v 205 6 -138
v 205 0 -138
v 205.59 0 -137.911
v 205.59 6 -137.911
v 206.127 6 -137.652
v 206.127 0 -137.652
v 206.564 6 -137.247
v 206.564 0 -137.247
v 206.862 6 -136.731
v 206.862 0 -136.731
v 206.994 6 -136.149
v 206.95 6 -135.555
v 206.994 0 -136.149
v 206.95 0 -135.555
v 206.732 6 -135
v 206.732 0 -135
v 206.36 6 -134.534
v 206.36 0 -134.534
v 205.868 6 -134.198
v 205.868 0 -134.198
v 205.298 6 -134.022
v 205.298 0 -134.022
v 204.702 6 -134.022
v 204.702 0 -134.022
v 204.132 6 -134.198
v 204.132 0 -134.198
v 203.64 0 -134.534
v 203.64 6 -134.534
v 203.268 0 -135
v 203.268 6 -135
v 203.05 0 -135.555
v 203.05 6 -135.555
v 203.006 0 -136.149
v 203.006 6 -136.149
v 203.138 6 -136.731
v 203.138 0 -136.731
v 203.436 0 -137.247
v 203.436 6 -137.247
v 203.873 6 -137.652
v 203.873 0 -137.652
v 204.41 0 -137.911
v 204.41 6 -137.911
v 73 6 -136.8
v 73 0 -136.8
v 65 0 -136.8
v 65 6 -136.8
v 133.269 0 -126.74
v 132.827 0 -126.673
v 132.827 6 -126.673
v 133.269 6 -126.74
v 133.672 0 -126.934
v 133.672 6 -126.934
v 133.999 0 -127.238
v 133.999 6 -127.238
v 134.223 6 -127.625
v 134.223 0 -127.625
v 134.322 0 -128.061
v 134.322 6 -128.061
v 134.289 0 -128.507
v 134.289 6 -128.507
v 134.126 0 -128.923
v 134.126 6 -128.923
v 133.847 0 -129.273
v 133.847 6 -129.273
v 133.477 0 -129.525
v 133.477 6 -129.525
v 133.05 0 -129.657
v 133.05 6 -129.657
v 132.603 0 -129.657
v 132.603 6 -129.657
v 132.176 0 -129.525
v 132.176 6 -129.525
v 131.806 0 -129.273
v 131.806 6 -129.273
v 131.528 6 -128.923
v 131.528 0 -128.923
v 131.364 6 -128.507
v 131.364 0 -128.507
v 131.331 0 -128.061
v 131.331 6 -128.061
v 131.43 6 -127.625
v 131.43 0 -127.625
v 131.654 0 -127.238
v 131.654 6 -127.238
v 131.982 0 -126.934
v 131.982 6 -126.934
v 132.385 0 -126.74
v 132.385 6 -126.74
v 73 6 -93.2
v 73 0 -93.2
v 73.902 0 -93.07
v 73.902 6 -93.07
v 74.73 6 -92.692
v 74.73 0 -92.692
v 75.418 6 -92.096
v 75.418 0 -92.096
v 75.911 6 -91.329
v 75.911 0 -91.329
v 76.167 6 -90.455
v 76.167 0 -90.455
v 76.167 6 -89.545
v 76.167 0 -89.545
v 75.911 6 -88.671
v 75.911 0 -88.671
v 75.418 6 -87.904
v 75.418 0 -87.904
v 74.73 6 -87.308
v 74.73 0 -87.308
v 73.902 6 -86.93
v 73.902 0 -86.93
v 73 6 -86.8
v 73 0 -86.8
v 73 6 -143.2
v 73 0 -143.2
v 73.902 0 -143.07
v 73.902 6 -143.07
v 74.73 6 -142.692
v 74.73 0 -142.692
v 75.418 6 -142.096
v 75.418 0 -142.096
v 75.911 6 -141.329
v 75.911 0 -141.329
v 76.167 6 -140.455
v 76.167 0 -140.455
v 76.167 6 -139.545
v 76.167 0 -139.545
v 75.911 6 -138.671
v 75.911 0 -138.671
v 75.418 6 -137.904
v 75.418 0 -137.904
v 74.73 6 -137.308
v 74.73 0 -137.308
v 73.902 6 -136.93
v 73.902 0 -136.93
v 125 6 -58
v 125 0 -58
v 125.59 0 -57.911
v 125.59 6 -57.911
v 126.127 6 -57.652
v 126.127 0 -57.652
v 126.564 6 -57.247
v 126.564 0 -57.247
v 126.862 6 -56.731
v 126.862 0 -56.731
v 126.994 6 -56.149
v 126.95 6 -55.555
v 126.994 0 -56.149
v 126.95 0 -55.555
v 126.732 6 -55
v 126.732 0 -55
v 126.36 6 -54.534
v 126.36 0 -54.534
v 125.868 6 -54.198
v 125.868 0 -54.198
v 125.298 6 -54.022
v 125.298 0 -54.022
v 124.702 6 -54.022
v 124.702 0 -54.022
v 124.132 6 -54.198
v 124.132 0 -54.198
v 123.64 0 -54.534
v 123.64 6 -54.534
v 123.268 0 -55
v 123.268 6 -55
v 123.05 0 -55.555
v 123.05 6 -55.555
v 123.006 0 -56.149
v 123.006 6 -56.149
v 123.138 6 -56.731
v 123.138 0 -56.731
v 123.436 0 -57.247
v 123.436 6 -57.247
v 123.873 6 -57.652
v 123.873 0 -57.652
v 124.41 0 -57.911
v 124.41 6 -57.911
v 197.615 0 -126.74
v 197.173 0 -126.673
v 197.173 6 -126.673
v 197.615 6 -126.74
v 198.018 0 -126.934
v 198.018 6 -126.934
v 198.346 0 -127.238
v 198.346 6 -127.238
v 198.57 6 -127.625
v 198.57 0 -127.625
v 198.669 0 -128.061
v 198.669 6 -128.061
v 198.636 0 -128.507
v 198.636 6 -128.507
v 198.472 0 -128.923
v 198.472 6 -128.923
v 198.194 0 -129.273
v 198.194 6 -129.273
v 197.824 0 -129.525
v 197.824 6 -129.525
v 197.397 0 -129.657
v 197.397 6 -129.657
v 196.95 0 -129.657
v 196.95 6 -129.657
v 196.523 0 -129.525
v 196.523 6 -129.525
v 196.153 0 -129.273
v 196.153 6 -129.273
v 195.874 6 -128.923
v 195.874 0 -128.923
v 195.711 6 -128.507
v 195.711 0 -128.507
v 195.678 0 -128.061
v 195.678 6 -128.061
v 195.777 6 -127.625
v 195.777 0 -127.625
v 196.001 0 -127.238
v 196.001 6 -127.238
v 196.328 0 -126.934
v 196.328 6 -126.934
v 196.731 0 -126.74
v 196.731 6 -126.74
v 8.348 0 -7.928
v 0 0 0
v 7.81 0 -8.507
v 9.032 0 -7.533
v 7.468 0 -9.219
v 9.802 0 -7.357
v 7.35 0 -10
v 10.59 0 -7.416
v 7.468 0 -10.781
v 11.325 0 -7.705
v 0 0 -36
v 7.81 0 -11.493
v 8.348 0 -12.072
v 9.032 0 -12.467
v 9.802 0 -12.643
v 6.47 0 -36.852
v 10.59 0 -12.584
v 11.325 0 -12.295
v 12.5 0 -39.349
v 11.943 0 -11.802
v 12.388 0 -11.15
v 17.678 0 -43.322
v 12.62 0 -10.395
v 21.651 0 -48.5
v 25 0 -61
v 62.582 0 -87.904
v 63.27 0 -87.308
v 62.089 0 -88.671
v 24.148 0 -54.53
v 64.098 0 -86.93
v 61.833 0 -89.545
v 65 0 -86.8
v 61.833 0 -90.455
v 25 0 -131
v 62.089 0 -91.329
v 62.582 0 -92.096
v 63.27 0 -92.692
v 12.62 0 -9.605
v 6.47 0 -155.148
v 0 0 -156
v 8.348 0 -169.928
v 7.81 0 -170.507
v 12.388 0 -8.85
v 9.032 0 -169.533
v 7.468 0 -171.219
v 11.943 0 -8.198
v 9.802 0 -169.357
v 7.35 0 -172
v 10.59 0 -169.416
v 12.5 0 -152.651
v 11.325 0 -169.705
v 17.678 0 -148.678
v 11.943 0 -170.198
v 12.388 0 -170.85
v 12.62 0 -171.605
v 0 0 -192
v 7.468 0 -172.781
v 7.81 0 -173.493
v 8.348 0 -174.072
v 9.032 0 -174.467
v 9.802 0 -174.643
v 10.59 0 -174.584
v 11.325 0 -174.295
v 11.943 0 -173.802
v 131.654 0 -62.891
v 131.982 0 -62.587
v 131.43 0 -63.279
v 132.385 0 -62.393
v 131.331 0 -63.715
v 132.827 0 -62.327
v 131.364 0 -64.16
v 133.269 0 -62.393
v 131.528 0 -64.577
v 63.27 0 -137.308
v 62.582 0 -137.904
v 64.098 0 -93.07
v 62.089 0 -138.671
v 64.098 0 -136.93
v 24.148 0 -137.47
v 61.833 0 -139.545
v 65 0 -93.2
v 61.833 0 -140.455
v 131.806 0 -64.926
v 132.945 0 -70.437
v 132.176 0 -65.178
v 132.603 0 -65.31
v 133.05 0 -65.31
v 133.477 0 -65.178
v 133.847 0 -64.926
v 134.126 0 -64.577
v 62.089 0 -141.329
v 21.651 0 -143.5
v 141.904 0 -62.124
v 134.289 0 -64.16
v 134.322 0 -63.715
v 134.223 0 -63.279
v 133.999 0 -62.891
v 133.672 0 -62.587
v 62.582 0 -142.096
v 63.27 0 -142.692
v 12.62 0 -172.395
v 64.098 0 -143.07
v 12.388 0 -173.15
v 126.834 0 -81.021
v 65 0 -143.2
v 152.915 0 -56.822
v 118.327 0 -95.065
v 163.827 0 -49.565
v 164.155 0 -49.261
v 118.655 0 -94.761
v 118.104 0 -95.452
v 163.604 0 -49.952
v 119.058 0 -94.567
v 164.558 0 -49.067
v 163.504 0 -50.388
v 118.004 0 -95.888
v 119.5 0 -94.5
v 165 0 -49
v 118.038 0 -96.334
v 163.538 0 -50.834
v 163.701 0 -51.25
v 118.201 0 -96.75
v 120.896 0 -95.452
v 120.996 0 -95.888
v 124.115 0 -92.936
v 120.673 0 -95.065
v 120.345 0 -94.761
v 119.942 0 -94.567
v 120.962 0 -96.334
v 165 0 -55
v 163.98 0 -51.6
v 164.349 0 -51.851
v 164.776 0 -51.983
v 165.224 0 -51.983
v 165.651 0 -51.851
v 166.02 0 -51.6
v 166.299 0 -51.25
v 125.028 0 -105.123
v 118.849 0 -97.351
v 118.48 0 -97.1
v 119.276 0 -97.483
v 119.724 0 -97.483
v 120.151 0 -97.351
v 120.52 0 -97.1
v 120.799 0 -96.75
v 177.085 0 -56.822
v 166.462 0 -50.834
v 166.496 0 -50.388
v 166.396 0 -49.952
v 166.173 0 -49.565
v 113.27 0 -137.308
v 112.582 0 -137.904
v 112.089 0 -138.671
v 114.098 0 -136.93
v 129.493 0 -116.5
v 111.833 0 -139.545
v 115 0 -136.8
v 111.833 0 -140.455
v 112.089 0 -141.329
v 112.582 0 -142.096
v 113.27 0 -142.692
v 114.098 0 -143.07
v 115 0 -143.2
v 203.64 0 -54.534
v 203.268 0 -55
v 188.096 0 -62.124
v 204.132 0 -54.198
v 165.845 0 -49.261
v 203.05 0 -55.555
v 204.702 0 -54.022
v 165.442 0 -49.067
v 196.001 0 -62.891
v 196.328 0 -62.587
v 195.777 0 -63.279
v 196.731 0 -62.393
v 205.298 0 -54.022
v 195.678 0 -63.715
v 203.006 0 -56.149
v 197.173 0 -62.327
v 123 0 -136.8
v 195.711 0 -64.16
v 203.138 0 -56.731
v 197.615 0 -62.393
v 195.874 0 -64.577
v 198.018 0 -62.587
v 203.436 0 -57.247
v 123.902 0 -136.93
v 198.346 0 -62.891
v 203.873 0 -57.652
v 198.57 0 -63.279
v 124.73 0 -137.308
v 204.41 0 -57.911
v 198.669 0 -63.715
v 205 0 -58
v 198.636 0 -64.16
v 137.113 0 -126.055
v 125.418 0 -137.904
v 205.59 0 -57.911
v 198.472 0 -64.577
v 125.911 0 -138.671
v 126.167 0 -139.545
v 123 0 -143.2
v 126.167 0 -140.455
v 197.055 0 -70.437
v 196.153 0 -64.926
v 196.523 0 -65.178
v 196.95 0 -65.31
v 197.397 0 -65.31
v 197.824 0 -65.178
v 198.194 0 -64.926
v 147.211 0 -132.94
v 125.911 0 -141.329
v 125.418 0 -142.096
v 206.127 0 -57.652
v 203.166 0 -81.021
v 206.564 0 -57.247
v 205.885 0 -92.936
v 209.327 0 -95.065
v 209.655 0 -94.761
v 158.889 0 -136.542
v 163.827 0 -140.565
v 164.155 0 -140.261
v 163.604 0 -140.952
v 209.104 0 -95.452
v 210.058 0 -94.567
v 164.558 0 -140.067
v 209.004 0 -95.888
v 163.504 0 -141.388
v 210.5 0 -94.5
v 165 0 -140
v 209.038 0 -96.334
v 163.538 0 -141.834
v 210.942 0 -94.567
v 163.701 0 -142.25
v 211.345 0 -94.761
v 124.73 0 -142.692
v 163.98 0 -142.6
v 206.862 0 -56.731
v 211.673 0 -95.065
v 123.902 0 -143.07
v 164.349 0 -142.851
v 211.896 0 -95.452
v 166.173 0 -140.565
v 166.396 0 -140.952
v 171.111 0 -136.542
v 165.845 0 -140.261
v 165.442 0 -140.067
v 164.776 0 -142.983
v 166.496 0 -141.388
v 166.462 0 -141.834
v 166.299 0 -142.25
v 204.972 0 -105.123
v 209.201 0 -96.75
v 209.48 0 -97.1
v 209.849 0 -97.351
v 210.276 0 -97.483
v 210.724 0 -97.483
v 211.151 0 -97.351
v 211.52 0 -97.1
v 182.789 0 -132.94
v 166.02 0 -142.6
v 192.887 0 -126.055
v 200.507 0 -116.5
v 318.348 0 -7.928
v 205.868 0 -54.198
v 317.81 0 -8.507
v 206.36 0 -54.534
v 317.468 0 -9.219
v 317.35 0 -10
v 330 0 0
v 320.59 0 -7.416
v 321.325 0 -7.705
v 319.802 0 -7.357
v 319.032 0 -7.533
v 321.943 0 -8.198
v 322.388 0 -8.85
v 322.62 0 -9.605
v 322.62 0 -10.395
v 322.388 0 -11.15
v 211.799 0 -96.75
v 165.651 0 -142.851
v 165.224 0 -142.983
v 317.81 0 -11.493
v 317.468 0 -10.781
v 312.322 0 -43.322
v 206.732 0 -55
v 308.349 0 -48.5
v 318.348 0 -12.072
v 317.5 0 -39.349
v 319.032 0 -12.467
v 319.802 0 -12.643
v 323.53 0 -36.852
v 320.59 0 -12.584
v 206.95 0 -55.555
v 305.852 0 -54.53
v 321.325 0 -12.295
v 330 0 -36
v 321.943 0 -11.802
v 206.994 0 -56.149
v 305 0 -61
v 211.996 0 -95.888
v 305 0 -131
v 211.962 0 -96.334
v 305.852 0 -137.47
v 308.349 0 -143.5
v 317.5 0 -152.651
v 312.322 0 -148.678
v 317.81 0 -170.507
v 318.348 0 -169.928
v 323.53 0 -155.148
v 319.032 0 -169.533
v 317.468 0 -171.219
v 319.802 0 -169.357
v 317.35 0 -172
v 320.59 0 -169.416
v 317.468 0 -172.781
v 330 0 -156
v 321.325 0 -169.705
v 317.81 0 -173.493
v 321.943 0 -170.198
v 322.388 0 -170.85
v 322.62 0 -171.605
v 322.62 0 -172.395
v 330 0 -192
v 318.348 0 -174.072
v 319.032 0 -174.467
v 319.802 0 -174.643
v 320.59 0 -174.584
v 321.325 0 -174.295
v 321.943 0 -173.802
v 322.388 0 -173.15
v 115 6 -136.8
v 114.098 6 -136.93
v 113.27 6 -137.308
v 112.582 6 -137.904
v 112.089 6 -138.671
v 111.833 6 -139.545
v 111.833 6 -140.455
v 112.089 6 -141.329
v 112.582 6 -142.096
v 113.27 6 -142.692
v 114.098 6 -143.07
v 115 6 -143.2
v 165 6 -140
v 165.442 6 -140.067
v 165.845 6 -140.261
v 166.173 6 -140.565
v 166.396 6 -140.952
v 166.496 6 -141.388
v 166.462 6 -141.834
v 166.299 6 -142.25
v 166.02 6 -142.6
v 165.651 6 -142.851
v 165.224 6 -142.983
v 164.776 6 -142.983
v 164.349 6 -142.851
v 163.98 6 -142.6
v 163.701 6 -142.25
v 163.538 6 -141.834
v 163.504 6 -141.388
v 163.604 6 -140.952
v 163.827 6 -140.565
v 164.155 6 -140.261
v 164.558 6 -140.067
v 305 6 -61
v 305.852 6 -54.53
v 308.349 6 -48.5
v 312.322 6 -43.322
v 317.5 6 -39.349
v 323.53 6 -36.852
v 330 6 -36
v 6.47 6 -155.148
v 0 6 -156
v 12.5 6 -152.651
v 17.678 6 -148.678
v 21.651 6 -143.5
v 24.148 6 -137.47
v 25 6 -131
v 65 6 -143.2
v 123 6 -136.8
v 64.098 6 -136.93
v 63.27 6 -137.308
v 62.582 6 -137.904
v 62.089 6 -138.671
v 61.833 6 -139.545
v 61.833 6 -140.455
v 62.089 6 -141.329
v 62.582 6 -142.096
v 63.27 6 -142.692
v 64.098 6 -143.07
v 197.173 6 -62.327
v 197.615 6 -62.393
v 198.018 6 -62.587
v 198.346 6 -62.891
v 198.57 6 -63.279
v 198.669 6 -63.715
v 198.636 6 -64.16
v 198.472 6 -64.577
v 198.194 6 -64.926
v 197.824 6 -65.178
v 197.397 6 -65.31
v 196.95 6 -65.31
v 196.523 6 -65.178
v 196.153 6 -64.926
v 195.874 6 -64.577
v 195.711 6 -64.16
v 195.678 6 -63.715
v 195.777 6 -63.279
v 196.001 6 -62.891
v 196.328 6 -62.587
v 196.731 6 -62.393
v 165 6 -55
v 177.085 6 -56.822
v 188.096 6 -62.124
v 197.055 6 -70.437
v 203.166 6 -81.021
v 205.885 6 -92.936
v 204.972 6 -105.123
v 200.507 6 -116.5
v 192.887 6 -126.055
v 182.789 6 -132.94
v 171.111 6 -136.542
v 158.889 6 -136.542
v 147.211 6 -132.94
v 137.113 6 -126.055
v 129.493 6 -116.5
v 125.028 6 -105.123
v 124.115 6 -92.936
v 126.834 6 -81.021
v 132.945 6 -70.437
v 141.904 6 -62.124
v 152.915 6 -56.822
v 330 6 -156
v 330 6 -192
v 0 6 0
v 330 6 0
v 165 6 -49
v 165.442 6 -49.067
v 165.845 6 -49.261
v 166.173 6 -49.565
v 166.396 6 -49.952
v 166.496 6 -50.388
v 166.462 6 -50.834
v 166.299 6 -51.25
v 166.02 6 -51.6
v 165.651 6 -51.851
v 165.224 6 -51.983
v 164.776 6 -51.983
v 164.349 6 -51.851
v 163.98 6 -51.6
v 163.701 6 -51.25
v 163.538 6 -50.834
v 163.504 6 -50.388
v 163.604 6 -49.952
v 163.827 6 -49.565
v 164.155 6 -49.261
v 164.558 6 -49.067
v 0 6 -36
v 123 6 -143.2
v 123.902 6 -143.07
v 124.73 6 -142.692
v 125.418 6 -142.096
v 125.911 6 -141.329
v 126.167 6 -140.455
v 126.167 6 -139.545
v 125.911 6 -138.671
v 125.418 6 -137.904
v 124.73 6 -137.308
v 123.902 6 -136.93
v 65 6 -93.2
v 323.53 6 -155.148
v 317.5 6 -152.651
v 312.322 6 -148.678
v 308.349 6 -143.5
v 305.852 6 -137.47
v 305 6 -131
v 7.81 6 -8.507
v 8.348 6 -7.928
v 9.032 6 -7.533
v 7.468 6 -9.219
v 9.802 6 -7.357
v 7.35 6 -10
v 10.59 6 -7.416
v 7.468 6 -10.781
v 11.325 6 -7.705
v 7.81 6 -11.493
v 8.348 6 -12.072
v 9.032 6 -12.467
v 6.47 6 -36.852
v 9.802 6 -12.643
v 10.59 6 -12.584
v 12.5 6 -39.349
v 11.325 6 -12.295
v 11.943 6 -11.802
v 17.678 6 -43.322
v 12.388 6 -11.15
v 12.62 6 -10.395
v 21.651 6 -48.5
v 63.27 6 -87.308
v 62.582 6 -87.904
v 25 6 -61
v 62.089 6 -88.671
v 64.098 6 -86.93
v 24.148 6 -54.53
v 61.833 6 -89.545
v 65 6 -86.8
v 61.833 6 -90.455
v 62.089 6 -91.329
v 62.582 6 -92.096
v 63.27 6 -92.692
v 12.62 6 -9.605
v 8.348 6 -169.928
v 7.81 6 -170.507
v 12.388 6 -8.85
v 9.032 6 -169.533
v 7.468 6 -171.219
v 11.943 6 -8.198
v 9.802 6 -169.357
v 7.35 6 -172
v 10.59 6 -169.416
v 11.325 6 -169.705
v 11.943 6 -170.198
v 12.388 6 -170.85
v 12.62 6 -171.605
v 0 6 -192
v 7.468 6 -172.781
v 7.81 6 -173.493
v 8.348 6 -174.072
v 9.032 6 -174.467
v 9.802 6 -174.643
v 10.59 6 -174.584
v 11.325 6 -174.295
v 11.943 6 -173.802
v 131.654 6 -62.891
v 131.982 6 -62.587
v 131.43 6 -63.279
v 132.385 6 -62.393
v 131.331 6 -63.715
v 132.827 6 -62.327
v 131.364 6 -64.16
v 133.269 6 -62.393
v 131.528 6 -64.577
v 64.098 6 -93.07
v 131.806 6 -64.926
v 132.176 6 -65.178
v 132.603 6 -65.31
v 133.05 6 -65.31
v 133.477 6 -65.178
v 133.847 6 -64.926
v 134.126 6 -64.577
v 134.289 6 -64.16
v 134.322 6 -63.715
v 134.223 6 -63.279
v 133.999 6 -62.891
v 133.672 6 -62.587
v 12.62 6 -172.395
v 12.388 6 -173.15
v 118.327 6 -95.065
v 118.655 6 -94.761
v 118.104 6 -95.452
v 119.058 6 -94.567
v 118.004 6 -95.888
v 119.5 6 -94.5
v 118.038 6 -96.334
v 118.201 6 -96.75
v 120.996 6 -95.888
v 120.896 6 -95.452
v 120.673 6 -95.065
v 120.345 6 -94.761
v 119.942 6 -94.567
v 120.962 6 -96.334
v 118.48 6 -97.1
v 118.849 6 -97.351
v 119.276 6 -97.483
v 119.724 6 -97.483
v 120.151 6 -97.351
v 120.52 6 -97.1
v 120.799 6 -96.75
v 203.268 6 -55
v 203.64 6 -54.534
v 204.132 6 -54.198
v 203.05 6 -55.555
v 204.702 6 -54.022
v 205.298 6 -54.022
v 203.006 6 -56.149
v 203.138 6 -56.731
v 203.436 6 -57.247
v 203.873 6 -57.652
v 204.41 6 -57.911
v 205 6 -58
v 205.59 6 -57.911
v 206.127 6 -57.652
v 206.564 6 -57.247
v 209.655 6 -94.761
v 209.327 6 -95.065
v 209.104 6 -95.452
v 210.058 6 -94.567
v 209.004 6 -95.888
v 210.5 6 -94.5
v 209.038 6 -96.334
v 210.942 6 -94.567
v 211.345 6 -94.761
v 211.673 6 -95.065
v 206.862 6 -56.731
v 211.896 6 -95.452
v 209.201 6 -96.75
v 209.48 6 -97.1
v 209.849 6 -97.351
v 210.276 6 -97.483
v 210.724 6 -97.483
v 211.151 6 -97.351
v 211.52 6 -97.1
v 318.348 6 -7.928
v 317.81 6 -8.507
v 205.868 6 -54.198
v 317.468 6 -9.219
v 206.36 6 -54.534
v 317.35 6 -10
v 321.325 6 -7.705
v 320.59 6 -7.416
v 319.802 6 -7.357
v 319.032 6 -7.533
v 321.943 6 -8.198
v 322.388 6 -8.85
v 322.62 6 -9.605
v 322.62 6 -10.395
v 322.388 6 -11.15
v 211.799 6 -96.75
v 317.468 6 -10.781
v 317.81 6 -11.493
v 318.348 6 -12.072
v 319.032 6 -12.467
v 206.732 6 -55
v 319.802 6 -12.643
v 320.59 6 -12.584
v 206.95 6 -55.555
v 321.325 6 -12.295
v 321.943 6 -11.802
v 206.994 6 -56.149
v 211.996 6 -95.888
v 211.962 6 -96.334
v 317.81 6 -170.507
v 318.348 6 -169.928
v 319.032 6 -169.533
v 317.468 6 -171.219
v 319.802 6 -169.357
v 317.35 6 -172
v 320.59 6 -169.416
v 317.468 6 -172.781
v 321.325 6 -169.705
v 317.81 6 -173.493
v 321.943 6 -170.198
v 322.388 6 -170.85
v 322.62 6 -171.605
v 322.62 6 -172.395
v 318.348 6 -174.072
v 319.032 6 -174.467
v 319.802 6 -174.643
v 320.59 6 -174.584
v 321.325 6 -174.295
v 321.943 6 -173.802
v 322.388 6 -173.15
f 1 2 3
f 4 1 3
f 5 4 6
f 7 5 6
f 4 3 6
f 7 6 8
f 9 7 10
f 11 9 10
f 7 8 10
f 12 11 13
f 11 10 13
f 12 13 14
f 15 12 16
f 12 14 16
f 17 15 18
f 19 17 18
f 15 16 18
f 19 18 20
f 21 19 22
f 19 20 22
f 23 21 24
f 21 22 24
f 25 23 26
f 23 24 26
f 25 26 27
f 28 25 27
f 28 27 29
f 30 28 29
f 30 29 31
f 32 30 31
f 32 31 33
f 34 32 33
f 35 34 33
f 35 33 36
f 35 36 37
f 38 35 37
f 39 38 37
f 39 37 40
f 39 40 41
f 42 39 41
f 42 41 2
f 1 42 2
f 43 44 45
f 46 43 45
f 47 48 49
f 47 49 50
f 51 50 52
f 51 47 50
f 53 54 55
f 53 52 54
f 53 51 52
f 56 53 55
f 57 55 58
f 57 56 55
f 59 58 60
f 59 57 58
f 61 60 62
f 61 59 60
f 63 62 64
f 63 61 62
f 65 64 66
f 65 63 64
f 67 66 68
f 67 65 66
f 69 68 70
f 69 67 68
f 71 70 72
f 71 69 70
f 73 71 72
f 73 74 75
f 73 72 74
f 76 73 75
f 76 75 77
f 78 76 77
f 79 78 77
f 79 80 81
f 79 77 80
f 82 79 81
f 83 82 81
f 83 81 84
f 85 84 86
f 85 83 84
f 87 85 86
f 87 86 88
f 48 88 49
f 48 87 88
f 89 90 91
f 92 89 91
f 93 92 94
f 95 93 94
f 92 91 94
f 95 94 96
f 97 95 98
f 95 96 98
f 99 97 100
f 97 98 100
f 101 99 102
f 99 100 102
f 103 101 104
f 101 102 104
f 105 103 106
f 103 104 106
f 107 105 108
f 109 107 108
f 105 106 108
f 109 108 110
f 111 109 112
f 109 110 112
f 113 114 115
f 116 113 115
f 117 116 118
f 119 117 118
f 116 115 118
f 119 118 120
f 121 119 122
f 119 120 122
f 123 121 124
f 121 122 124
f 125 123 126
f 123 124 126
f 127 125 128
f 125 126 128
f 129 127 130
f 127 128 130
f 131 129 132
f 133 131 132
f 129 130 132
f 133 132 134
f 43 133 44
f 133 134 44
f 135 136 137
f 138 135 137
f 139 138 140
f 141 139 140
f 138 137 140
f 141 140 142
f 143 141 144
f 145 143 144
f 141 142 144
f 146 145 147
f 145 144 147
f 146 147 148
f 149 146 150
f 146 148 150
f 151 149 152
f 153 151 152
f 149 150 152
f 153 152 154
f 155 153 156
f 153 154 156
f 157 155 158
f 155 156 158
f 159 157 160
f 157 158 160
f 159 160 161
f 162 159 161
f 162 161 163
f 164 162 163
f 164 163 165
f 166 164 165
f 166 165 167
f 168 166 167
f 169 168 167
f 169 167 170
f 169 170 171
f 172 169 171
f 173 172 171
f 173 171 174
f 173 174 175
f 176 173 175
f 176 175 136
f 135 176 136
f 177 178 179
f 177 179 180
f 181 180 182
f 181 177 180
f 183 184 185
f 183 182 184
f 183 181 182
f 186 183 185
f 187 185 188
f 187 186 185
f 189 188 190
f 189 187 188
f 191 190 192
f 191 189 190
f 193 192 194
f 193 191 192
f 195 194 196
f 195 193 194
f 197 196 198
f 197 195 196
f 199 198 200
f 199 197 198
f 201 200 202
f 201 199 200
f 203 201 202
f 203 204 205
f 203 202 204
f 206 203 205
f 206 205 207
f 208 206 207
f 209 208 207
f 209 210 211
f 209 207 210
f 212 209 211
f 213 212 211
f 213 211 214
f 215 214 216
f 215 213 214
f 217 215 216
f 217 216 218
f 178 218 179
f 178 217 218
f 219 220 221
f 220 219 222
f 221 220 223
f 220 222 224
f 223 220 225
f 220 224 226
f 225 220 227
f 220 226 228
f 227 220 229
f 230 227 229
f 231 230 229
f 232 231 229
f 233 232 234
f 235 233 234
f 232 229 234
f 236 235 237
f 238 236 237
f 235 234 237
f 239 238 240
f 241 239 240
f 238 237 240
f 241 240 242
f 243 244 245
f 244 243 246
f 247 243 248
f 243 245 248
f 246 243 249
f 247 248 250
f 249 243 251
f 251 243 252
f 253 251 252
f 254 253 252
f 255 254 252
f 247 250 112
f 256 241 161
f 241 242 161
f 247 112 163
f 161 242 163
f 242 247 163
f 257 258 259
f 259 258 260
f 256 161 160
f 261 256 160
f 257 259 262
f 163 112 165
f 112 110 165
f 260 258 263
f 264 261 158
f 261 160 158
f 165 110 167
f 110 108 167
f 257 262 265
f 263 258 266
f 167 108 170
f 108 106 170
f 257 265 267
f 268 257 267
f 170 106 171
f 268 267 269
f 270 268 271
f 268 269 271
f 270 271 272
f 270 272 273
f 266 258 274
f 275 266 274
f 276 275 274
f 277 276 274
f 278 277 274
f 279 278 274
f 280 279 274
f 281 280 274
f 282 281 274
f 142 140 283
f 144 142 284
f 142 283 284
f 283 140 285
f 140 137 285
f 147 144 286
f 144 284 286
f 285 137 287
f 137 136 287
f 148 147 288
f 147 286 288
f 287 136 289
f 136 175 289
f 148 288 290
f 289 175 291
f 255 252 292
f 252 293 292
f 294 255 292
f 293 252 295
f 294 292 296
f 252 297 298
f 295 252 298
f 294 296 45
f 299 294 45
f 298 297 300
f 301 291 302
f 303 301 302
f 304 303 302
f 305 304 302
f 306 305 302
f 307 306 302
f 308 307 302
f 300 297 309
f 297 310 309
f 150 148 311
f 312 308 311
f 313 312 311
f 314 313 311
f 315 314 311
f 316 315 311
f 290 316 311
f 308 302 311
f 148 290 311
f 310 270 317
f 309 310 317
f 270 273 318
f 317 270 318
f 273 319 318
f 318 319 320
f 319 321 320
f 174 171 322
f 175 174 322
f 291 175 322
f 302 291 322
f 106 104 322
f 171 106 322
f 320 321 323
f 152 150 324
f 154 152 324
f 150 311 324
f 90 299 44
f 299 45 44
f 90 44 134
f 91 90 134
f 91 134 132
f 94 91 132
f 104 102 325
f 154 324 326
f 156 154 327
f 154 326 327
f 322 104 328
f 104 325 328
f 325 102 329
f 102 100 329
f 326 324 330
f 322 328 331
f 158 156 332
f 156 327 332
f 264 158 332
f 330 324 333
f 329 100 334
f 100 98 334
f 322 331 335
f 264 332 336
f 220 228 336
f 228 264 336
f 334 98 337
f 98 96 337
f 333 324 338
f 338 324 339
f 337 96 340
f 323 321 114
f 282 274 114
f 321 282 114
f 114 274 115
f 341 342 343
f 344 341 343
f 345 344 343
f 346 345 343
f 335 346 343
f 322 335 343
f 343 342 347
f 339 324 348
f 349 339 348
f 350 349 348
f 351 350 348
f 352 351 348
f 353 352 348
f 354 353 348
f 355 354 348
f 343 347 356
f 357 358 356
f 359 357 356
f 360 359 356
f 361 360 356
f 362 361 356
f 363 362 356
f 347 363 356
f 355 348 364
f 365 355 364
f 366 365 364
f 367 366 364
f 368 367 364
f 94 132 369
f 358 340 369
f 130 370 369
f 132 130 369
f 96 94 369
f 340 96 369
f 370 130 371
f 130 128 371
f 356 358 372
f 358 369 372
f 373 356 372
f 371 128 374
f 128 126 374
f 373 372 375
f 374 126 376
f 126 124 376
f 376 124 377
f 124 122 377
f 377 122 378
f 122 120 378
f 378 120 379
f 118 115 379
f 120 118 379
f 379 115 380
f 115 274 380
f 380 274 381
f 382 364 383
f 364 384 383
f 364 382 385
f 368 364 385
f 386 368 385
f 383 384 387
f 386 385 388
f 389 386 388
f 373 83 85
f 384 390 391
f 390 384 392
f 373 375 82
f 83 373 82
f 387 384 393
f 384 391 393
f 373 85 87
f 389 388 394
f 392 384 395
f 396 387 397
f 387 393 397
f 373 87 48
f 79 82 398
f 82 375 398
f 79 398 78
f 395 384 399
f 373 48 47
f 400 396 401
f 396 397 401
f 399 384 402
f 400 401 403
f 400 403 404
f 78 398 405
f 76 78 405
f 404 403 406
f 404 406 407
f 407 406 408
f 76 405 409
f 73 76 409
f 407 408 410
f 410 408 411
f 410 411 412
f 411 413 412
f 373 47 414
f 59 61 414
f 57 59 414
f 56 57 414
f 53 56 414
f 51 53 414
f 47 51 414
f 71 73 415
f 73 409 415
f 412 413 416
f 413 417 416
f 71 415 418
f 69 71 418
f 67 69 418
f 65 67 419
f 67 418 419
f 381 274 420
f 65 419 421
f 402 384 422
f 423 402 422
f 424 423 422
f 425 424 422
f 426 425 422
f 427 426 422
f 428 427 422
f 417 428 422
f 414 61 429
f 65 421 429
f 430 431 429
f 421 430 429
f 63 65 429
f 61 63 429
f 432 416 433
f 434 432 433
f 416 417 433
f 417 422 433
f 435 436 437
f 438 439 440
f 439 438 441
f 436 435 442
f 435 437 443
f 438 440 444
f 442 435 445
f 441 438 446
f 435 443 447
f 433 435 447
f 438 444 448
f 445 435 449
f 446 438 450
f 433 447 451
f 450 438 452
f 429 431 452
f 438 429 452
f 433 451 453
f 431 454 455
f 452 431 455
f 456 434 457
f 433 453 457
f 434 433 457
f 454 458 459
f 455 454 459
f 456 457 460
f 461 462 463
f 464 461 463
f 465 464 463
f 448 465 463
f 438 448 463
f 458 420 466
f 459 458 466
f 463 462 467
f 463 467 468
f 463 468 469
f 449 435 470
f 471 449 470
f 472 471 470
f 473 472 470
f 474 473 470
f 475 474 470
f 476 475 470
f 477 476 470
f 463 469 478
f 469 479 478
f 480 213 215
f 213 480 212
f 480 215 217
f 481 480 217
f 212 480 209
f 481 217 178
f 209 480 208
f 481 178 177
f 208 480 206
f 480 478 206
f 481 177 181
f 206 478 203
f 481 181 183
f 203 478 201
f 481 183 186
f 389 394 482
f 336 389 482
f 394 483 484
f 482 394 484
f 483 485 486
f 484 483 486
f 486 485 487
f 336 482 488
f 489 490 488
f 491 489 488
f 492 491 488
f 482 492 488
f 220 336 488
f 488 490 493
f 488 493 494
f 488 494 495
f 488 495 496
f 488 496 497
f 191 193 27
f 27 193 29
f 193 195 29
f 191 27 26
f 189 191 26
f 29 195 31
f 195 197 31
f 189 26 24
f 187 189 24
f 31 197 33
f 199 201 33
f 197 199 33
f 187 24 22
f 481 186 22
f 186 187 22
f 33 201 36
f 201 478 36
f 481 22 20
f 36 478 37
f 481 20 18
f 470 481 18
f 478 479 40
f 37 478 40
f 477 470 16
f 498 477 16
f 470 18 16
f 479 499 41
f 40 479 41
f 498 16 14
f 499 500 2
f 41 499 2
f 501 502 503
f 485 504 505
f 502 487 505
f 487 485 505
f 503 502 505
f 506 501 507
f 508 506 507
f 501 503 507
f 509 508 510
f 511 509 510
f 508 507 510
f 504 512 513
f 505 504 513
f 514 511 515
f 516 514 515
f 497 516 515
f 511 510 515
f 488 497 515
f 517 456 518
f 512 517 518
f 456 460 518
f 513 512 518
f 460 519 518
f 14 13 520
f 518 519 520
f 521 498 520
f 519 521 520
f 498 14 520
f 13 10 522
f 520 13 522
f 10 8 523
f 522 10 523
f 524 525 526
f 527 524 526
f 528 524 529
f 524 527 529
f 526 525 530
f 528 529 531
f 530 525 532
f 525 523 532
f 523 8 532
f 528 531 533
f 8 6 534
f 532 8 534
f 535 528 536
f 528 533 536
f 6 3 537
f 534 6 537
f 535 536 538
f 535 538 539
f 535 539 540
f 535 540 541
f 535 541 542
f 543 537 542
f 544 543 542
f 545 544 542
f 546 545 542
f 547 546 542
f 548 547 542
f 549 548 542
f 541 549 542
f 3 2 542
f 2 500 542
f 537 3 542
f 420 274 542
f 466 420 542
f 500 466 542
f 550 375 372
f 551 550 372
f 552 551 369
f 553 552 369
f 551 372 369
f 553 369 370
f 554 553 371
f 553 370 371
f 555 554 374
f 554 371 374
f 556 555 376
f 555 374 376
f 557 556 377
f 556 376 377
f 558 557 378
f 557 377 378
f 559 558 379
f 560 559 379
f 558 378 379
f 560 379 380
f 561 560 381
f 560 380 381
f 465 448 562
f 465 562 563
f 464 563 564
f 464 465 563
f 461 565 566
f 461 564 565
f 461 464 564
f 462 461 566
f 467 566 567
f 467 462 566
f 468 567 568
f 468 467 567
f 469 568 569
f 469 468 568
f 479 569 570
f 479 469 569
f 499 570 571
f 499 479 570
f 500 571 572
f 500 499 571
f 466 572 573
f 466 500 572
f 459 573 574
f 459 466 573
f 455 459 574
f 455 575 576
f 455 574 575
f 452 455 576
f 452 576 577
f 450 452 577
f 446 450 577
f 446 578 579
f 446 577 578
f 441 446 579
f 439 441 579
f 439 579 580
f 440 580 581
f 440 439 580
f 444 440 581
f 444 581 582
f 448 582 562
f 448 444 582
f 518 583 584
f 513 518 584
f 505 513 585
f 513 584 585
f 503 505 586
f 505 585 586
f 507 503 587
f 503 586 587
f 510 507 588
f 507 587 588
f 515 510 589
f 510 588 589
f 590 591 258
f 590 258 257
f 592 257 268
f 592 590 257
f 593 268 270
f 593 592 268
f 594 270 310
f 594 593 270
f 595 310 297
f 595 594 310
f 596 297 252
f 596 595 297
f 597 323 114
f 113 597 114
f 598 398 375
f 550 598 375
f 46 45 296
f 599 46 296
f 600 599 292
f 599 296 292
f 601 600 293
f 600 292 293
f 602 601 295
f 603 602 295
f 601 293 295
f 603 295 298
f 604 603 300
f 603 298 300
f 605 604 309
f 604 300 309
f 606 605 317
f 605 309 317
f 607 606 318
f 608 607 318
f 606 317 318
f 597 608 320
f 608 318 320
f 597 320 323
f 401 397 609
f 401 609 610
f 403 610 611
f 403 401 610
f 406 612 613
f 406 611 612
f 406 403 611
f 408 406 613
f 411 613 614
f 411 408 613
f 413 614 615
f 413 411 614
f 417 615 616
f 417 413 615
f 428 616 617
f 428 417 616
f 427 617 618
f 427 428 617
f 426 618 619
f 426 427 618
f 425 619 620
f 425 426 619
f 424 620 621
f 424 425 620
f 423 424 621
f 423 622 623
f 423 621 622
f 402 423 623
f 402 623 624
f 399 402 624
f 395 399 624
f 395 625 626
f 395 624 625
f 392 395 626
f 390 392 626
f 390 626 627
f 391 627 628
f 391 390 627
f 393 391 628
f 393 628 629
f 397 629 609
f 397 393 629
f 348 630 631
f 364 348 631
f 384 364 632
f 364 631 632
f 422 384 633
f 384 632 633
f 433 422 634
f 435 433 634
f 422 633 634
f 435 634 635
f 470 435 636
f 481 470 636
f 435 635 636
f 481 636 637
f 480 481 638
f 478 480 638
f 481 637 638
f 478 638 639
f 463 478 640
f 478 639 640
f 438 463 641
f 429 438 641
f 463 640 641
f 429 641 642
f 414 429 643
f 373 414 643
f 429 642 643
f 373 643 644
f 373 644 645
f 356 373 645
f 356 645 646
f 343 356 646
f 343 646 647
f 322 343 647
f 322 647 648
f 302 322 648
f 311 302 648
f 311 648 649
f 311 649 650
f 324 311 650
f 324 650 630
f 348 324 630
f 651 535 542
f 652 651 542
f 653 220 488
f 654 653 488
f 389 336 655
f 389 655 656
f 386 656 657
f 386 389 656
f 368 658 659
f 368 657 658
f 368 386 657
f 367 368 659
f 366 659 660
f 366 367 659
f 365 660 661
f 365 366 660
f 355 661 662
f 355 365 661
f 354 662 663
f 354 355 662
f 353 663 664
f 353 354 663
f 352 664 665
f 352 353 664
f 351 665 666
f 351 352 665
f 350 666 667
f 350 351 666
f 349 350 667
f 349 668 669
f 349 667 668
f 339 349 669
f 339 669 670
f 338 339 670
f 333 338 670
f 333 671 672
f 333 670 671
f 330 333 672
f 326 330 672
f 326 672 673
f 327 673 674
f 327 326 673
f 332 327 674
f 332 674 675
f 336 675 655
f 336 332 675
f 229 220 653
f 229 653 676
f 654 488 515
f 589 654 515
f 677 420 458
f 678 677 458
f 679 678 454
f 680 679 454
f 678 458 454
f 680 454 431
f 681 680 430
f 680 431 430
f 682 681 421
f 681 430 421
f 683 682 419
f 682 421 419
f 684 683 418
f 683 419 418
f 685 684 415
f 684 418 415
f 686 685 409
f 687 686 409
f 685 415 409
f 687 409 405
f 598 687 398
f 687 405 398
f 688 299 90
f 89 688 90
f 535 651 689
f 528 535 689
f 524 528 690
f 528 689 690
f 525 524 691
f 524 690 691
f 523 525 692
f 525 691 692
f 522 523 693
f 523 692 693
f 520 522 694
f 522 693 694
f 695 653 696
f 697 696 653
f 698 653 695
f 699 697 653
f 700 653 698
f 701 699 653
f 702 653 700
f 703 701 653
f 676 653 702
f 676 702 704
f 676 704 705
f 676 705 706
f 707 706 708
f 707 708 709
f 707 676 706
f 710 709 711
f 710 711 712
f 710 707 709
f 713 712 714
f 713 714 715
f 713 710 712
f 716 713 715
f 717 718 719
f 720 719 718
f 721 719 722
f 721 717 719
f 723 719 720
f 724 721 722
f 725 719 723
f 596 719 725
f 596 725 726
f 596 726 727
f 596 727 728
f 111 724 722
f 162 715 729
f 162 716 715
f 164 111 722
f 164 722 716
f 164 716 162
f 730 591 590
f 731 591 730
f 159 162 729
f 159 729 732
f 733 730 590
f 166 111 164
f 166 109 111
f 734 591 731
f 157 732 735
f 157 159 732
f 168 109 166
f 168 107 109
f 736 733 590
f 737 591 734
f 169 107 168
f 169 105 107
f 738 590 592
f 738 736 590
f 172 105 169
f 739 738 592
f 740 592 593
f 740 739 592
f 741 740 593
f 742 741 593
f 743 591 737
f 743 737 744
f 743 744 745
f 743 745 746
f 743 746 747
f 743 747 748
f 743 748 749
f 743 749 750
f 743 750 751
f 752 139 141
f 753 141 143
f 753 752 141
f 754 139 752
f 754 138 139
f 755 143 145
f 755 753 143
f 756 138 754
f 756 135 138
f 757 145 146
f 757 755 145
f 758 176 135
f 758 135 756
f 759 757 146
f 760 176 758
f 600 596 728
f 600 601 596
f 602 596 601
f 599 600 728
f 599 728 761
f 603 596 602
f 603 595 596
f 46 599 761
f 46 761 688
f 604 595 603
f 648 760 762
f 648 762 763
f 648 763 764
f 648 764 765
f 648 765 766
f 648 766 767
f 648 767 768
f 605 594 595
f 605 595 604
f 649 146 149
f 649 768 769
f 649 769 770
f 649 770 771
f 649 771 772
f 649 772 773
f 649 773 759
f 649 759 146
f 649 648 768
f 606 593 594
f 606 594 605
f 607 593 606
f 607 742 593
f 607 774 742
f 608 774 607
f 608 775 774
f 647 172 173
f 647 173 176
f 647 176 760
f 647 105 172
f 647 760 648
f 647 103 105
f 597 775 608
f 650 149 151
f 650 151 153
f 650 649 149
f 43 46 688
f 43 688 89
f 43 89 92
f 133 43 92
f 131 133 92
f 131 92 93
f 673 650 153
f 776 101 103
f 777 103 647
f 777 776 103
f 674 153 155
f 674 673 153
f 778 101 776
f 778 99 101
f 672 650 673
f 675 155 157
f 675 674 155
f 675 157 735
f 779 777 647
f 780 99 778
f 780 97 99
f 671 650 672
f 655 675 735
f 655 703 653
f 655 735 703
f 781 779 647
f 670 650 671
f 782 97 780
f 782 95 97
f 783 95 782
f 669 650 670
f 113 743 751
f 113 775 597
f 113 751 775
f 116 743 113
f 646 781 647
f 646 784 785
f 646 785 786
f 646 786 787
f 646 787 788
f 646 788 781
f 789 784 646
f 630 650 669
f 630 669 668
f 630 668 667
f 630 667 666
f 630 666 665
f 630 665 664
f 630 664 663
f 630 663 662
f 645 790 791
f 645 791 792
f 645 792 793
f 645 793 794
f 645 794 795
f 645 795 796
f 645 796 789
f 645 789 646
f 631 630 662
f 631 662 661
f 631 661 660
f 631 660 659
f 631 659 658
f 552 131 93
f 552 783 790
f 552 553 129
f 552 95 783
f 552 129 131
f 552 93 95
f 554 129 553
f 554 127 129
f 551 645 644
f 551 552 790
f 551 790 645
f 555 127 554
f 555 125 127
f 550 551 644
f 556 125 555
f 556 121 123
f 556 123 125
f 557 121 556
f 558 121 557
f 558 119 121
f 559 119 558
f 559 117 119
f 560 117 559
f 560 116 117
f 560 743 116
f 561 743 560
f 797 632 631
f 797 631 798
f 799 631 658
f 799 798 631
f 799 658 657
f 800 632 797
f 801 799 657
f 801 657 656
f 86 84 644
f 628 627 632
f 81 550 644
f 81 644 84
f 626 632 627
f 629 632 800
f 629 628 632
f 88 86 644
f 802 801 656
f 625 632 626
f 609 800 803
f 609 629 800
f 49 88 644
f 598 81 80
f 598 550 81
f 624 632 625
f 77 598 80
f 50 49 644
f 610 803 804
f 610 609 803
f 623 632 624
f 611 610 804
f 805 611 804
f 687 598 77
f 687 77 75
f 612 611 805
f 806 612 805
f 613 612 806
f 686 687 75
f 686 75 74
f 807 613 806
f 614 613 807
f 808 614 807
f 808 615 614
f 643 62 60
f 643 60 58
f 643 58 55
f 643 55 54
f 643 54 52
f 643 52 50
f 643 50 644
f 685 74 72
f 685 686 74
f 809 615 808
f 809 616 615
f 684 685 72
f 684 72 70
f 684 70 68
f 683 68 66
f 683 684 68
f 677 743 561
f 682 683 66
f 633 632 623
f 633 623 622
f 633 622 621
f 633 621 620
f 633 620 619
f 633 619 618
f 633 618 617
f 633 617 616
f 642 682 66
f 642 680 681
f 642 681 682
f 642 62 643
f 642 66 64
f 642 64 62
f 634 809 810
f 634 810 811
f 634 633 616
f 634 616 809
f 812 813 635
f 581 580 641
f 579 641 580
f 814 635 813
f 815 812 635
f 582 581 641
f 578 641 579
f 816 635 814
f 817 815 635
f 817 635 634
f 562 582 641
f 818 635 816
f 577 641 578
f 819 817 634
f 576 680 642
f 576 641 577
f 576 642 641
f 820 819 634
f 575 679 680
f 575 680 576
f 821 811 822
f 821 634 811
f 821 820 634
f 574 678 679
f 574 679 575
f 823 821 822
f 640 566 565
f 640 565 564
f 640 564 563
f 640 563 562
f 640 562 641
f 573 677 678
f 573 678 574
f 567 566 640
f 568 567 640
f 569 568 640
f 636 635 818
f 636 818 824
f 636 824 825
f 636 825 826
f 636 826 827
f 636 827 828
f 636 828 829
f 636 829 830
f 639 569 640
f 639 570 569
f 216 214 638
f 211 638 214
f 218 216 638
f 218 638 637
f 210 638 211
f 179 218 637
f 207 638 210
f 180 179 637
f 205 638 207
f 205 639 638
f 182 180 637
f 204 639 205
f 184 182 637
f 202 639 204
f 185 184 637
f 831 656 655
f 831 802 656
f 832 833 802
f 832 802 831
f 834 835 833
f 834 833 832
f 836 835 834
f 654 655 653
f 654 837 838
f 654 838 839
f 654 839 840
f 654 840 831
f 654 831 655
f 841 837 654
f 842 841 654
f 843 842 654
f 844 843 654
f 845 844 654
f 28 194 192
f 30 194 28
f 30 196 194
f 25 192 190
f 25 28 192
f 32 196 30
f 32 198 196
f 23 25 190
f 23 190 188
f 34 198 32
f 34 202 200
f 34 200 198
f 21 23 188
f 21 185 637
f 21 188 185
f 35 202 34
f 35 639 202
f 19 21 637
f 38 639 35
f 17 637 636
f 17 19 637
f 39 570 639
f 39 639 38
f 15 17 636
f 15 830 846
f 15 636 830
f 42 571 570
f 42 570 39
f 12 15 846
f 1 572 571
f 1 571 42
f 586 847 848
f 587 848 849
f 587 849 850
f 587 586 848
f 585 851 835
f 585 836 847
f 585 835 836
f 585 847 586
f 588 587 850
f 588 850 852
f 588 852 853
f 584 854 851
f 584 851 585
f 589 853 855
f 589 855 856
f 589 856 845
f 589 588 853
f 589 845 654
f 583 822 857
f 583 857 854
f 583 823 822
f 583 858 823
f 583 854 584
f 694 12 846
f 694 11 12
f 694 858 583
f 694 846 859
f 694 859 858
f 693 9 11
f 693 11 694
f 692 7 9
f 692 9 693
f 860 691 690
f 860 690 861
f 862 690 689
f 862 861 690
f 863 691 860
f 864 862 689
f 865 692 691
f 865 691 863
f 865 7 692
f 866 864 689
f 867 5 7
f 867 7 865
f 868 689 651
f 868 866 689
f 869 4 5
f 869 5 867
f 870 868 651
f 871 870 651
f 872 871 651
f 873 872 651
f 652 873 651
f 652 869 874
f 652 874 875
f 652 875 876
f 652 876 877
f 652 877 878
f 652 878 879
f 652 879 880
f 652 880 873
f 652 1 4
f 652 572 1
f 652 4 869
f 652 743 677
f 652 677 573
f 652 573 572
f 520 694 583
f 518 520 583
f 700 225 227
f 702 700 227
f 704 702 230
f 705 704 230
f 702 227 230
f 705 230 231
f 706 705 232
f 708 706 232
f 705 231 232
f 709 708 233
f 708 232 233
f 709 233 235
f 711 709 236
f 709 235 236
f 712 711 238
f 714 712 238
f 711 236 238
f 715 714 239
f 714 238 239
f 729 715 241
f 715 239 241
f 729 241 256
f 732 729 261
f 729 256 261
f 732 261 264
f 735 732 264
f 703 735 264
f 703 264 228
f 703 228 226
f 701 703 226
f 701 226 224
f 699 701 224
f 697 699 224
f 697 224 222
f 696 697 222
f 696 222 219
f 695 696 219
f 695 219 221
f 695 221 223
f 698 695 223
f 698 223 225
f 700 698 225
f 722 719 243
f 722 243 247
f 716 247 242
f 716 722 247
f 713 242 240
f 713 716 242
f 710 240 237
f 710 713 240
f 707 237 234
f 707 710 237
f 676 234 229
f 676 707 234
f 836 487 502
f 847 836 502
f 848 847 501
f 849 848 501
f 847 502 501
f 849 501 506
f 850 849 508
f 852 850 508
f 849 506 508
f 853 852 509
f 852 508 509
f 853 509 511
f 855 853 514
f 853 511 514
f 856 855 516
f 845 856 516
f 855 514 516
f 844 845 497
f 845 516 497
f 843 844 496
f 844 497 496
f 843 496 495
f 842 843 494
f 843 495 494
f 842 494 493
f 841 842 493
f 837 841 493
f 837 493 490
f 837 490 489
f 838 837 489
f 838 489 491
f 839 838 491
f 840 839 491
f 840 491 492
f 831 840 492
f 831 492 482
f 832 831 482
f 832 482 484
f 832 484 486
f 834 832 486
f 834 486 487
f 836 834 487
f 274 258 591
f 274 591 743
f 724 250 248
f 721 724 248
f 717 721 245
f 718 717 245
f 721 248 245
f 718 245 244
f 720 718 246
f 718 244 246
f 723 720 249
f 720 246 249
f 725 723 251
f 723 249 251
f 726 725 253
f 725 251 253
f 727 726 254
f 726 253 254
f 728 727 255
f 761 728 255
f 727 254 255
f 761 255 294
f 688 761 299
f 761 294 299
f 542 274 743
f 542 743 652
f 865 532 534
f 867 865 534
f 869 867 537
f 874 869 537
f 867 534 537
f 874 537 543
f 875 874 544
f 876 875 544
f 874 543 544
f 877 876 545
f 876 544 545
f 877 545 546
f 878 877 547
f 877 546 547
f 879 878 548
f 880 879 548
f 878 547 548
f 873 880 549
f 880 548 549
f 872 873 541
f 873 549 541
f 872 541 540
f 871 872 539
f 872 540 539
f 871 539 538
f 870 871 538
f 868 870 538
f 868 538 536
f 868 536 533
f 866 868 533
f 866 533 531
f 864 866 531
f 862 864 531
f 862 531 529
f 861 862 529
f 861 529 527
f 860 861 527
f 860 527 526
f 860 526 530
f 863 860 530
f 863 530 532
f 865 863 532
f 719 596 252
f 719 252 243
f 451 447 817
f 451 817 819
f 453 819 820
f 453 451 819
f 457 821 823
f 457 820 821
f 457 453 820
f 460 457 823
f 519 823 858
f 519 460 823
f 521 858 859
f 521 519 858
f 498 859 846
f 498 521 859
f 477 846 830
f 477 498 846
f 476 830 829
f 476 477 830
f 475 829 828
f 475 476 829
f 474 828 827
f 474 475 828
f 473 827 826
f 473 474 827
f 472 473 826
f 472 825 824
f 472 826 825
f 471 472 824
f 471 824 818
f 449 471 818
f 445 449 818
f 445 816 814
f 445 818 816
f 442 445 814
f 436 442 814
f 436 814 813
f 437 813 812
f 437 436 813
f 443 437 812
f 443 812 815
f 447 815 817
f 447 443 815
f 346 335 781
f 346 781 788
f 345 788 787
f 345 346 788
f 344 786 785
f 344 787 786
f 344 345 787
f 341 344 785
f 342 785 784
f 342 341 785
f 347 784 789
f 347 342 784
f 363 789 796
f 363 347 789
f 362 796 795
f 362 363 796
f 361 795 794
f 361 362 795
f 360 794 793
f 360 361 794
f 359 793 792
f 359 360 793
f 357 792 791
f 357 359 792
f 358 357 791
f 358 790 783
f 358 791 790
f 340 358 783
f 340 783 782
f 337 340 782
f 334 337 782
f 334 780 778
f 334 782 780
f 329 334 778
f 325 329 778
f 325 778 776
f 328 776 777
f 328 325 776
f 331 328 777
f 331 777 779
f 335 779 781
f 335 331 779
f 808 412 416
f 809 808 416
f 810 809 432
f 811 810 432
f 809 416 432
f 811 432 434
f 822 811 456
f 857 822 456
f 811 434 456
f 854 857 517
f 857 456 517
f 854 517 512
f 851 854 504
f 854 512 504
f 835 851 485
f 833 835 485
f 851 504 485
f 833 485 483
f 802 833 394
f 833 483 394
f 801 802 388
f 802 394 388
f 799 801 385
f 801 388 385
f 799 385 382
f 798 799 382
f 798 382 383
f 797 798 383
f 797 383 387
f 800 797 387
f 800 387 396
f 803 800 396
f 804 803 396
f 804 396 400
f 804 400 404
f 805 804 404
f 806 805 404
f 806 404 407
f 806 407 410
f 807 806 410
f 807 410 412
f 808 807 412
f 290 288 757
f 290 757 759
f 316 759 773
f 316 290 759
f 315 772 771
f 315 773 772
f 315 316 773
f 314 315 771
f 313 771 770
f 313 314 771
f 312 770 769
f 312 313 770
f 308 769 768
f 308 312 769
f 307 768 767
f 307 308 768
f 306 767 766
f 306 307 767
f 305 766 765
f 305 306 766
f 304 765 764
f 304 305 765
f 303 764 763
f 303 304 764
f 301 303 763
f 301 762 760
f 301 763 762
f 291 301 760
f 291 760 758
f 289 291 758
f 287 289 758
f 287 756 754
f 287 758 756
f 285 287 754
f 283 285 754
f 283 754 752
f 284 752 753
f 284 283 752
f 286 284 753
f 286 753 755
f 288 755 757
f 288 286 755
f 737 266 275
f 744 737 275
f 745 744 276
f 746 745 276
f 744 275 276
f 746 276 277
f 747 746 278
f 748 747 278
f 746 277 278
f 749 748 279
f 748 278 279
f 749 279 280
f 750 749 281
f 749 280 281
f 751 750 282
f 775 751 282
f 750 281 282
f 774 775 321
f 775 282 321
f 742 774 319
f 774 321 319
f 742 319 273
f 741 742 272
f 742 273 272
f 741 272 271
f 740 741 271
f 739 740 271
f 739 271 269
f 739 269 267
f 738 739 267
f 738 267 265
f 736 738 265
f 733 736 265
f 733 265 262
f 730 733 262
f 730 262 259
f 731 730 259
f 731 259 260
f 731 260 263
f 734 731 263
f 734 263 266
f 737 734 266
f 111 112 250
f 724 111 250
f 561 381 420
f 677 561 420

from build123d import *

# Parameters (mm, degrees)
SKETCH1_W                = 330
SKETCH1_H                = 192
BOSS_EXTRUDE1_DEPTH      = 6
CUT_EXTRUDE1_DEPTH       = 382.837661841
CUT_EXTRUDE1_DEPTH_BACK  = 382.837661841
SKETCH2_R                = 1.5
SKETCH3_R                = 41
CUT_EXTRUDE2_DEPTH       = 382.837661841
CUT_EXTRUDE5_DEPTH       = 10
SKETCH11_R               = 2
CUT_EXTRUDE6_DEPTH       = 10
M5_CLEARANCE_HOLE1_D     = 5.3
M5_CLEARANCE_HOLE1_DEPTH = 11.94
M5_CLEARANCE_HOLE1_TIP   = 1.59228064
CUT_EXTRUDE10_DEPTH      = 382.837661841


with BuildPart() as part:
    # Sketch1 → Boss-Extrude1 (new body)
    with BuildSketch(Plane(origin=(0, 0, 0), x_dir=(1, 0, 0), z_dir=(0, 1, 0))):
        with Locations((165, 96)):
            Rectangle(SKETCH1_W, SKETCH1_H)
    extrude(amount=BOSS_EXTRUDE1_DEPTH)

    # Sketch2 → Cut-Extrude1 (cut, two sides: drawn at the far end of the back side and taken through both)
    with BuildSketch(Plane(origin=(0, 6, 0), x_dir=(1, 0, 0), z_dir=(0, 1, 0)).offset(-CUT_EXTRUDE1_DEPTH_BACK)):
        with Locations(Location((165, 141.5, 0), (0, 0, 270))):
            Circle(SKETCH2_R)
        with Locations(Location((197.173358544, 128.173358544, 0), (0, 0, 270))):
            Circle(SKETCH2_R)
        with Locations(Location((210.5, 96, 0), (0, 0, 270))):
            Circle(SKETCH2_R)
        with Locations(Location((165, 50.5, 0), (0, 0, 270))):
            Circle(SKETCH2_R)
        with Locations(Location((132.826641456, 63.826641456, 0), (0, 0, 270))):
            Circle(SKETCH2_R)
        with Locations(Location((119.5, 96, 0), (0, 0, 270))):
            Circle(SKETCH2_R)
        with Locations(Location((132.826641456, 128.173358544, 0), (0, 0, 270))):
            Circle(SKETCH2_R)
        with Locations(Location((197.173358544, 63.826641456, 0), (0, 0, 270))):
            Circle(SKETCH2_R)
    extrude(amount=CUT_EXTRUDE1_DEPTH + CUT_EXTRUDE1_DEPTH_BACK, mode=Mode.SUBTRACT)

    # Sketch3 → Cut-Extrude2 (cut, through all)
    with BuildSketch(Plane(origin=(0, 6, 0), x_dir=(1, 0, 0), z_dir=(0, 1, 0))):
        with Locations(Location((165, 96, 0), (0, 0, 270))):
            Circle(SKETCH3_R)
    extrude(amount=-CUT_EXTRUDE2_DEPTH, mode=Mode.SUBTRACT)

    # Sketch10 → Cut-Extrude5 (cut)
    with BuildSketch(Plane.XZ):
        with BuildLine():
            Line((123, -136.8), (115, -136.8))
            ThreePointArc((115, -136.8), (111.8, -140), (115, -143.2))
            Line((115, -143.2), (123, -143.2))
            ThreePointArc((123, -143.2), (126.2, -140), (123, -136.8))
        make_face()
        with BuildLine():
            Line((73, -136.8), (65, -136.8))
            ThreePointArc((65, -136.8), (61.8, -140), (65, -143.2))
            Line((65, -143.2), (73, -143.2))
            ThreePointArc((73, -143.2), (76.2, -140), (73, -136.8))
        make_face()
        with BuildLine():
            Line((73, -86.8), (65, -86.8))
            ThreePointArc((65, -86.8), (61.8, -90), (65, -93.2))
            Line((65, -93.2), (73, -93.2))
            ThreePointArc((73, -93.2), (76.2, -90), (73, -86.8))
        make_face()
    extrude(amount=-CUT_EXTRUDE5_DEPTH, mode=Mode.SUBTRACT)

    # Sketch11 → Cut-Extrude6 (cut)
    with BuildSketch(Plane.XZ):
        with Locations(Location((125, -56, 0), (0, 0, 270))):
            Circle(SKETCH11_R)
        with Locations(Location((205, -56, 0), (0, 0, 270))):
            Circle(SKETCH11_R)
        with Locations(Location((205, -136, 0), (0, 0, 270))):
            Circle(SKETCH11_R)
    extrude(amount=-CUT_EXTRUDE6_DEPTH, mode=Mode.SUBTRACT)

    # M5 Clearance Hole1
    with Locations(Plane(origin=(0, 6, 0), x_dir=(1, 0, 0), z_dir=(0, 1, 0))):
        with Locations((10, 172), (10, 10), (320, 10), (320, 172)):
            Hole(M5_CLEARANCE_HOLE1_D / 2, depth=M5_CLEARANCE_HOLE1_DEPTH)
            with Locations((0, 0, -(M5_CLEARANCE_HOLE1_DEPTH + M5_CLEARANCE_HOLE1_TIP / 2))):  # 118° drill point
                Cone(0, M5_CLEARANCE_HOLE1_D / 2, M5_CLEARANCE_HOLE1_TIP, mode=Mode.SUBTRACT)

    # Sketch19 → Cut-Extrude10 (cut, through all)
    with BuildSketch(Plane(origin=(0, 6, 0), x_dir=(1, 0, 0), z_dir=(0, 1, 0))):
        with BuildLine():
            Line((25, 131), (25, 61))
            ThreePointArc((25, 61), (0, 36), (-25, 61))
            Line((-25, 61), (-25, 131))
            ThreePointArc((-25, 131), (0, 156), (25, 131))
        make_face()
        with BuildLine():
            Line((305, 131), (305, 61))
            ThreePointArc((305, 61), (330, 36), (355, 61))
            Line((355, 61), (355, 131))
            ThreePointArc((355, 131), (330, 156), (305, 131))
        make_face()
    extrude(amount=-CUT_EXTRUDE10_DEPTH, mode=Mode.SUBTRACT)


solid = part.part
